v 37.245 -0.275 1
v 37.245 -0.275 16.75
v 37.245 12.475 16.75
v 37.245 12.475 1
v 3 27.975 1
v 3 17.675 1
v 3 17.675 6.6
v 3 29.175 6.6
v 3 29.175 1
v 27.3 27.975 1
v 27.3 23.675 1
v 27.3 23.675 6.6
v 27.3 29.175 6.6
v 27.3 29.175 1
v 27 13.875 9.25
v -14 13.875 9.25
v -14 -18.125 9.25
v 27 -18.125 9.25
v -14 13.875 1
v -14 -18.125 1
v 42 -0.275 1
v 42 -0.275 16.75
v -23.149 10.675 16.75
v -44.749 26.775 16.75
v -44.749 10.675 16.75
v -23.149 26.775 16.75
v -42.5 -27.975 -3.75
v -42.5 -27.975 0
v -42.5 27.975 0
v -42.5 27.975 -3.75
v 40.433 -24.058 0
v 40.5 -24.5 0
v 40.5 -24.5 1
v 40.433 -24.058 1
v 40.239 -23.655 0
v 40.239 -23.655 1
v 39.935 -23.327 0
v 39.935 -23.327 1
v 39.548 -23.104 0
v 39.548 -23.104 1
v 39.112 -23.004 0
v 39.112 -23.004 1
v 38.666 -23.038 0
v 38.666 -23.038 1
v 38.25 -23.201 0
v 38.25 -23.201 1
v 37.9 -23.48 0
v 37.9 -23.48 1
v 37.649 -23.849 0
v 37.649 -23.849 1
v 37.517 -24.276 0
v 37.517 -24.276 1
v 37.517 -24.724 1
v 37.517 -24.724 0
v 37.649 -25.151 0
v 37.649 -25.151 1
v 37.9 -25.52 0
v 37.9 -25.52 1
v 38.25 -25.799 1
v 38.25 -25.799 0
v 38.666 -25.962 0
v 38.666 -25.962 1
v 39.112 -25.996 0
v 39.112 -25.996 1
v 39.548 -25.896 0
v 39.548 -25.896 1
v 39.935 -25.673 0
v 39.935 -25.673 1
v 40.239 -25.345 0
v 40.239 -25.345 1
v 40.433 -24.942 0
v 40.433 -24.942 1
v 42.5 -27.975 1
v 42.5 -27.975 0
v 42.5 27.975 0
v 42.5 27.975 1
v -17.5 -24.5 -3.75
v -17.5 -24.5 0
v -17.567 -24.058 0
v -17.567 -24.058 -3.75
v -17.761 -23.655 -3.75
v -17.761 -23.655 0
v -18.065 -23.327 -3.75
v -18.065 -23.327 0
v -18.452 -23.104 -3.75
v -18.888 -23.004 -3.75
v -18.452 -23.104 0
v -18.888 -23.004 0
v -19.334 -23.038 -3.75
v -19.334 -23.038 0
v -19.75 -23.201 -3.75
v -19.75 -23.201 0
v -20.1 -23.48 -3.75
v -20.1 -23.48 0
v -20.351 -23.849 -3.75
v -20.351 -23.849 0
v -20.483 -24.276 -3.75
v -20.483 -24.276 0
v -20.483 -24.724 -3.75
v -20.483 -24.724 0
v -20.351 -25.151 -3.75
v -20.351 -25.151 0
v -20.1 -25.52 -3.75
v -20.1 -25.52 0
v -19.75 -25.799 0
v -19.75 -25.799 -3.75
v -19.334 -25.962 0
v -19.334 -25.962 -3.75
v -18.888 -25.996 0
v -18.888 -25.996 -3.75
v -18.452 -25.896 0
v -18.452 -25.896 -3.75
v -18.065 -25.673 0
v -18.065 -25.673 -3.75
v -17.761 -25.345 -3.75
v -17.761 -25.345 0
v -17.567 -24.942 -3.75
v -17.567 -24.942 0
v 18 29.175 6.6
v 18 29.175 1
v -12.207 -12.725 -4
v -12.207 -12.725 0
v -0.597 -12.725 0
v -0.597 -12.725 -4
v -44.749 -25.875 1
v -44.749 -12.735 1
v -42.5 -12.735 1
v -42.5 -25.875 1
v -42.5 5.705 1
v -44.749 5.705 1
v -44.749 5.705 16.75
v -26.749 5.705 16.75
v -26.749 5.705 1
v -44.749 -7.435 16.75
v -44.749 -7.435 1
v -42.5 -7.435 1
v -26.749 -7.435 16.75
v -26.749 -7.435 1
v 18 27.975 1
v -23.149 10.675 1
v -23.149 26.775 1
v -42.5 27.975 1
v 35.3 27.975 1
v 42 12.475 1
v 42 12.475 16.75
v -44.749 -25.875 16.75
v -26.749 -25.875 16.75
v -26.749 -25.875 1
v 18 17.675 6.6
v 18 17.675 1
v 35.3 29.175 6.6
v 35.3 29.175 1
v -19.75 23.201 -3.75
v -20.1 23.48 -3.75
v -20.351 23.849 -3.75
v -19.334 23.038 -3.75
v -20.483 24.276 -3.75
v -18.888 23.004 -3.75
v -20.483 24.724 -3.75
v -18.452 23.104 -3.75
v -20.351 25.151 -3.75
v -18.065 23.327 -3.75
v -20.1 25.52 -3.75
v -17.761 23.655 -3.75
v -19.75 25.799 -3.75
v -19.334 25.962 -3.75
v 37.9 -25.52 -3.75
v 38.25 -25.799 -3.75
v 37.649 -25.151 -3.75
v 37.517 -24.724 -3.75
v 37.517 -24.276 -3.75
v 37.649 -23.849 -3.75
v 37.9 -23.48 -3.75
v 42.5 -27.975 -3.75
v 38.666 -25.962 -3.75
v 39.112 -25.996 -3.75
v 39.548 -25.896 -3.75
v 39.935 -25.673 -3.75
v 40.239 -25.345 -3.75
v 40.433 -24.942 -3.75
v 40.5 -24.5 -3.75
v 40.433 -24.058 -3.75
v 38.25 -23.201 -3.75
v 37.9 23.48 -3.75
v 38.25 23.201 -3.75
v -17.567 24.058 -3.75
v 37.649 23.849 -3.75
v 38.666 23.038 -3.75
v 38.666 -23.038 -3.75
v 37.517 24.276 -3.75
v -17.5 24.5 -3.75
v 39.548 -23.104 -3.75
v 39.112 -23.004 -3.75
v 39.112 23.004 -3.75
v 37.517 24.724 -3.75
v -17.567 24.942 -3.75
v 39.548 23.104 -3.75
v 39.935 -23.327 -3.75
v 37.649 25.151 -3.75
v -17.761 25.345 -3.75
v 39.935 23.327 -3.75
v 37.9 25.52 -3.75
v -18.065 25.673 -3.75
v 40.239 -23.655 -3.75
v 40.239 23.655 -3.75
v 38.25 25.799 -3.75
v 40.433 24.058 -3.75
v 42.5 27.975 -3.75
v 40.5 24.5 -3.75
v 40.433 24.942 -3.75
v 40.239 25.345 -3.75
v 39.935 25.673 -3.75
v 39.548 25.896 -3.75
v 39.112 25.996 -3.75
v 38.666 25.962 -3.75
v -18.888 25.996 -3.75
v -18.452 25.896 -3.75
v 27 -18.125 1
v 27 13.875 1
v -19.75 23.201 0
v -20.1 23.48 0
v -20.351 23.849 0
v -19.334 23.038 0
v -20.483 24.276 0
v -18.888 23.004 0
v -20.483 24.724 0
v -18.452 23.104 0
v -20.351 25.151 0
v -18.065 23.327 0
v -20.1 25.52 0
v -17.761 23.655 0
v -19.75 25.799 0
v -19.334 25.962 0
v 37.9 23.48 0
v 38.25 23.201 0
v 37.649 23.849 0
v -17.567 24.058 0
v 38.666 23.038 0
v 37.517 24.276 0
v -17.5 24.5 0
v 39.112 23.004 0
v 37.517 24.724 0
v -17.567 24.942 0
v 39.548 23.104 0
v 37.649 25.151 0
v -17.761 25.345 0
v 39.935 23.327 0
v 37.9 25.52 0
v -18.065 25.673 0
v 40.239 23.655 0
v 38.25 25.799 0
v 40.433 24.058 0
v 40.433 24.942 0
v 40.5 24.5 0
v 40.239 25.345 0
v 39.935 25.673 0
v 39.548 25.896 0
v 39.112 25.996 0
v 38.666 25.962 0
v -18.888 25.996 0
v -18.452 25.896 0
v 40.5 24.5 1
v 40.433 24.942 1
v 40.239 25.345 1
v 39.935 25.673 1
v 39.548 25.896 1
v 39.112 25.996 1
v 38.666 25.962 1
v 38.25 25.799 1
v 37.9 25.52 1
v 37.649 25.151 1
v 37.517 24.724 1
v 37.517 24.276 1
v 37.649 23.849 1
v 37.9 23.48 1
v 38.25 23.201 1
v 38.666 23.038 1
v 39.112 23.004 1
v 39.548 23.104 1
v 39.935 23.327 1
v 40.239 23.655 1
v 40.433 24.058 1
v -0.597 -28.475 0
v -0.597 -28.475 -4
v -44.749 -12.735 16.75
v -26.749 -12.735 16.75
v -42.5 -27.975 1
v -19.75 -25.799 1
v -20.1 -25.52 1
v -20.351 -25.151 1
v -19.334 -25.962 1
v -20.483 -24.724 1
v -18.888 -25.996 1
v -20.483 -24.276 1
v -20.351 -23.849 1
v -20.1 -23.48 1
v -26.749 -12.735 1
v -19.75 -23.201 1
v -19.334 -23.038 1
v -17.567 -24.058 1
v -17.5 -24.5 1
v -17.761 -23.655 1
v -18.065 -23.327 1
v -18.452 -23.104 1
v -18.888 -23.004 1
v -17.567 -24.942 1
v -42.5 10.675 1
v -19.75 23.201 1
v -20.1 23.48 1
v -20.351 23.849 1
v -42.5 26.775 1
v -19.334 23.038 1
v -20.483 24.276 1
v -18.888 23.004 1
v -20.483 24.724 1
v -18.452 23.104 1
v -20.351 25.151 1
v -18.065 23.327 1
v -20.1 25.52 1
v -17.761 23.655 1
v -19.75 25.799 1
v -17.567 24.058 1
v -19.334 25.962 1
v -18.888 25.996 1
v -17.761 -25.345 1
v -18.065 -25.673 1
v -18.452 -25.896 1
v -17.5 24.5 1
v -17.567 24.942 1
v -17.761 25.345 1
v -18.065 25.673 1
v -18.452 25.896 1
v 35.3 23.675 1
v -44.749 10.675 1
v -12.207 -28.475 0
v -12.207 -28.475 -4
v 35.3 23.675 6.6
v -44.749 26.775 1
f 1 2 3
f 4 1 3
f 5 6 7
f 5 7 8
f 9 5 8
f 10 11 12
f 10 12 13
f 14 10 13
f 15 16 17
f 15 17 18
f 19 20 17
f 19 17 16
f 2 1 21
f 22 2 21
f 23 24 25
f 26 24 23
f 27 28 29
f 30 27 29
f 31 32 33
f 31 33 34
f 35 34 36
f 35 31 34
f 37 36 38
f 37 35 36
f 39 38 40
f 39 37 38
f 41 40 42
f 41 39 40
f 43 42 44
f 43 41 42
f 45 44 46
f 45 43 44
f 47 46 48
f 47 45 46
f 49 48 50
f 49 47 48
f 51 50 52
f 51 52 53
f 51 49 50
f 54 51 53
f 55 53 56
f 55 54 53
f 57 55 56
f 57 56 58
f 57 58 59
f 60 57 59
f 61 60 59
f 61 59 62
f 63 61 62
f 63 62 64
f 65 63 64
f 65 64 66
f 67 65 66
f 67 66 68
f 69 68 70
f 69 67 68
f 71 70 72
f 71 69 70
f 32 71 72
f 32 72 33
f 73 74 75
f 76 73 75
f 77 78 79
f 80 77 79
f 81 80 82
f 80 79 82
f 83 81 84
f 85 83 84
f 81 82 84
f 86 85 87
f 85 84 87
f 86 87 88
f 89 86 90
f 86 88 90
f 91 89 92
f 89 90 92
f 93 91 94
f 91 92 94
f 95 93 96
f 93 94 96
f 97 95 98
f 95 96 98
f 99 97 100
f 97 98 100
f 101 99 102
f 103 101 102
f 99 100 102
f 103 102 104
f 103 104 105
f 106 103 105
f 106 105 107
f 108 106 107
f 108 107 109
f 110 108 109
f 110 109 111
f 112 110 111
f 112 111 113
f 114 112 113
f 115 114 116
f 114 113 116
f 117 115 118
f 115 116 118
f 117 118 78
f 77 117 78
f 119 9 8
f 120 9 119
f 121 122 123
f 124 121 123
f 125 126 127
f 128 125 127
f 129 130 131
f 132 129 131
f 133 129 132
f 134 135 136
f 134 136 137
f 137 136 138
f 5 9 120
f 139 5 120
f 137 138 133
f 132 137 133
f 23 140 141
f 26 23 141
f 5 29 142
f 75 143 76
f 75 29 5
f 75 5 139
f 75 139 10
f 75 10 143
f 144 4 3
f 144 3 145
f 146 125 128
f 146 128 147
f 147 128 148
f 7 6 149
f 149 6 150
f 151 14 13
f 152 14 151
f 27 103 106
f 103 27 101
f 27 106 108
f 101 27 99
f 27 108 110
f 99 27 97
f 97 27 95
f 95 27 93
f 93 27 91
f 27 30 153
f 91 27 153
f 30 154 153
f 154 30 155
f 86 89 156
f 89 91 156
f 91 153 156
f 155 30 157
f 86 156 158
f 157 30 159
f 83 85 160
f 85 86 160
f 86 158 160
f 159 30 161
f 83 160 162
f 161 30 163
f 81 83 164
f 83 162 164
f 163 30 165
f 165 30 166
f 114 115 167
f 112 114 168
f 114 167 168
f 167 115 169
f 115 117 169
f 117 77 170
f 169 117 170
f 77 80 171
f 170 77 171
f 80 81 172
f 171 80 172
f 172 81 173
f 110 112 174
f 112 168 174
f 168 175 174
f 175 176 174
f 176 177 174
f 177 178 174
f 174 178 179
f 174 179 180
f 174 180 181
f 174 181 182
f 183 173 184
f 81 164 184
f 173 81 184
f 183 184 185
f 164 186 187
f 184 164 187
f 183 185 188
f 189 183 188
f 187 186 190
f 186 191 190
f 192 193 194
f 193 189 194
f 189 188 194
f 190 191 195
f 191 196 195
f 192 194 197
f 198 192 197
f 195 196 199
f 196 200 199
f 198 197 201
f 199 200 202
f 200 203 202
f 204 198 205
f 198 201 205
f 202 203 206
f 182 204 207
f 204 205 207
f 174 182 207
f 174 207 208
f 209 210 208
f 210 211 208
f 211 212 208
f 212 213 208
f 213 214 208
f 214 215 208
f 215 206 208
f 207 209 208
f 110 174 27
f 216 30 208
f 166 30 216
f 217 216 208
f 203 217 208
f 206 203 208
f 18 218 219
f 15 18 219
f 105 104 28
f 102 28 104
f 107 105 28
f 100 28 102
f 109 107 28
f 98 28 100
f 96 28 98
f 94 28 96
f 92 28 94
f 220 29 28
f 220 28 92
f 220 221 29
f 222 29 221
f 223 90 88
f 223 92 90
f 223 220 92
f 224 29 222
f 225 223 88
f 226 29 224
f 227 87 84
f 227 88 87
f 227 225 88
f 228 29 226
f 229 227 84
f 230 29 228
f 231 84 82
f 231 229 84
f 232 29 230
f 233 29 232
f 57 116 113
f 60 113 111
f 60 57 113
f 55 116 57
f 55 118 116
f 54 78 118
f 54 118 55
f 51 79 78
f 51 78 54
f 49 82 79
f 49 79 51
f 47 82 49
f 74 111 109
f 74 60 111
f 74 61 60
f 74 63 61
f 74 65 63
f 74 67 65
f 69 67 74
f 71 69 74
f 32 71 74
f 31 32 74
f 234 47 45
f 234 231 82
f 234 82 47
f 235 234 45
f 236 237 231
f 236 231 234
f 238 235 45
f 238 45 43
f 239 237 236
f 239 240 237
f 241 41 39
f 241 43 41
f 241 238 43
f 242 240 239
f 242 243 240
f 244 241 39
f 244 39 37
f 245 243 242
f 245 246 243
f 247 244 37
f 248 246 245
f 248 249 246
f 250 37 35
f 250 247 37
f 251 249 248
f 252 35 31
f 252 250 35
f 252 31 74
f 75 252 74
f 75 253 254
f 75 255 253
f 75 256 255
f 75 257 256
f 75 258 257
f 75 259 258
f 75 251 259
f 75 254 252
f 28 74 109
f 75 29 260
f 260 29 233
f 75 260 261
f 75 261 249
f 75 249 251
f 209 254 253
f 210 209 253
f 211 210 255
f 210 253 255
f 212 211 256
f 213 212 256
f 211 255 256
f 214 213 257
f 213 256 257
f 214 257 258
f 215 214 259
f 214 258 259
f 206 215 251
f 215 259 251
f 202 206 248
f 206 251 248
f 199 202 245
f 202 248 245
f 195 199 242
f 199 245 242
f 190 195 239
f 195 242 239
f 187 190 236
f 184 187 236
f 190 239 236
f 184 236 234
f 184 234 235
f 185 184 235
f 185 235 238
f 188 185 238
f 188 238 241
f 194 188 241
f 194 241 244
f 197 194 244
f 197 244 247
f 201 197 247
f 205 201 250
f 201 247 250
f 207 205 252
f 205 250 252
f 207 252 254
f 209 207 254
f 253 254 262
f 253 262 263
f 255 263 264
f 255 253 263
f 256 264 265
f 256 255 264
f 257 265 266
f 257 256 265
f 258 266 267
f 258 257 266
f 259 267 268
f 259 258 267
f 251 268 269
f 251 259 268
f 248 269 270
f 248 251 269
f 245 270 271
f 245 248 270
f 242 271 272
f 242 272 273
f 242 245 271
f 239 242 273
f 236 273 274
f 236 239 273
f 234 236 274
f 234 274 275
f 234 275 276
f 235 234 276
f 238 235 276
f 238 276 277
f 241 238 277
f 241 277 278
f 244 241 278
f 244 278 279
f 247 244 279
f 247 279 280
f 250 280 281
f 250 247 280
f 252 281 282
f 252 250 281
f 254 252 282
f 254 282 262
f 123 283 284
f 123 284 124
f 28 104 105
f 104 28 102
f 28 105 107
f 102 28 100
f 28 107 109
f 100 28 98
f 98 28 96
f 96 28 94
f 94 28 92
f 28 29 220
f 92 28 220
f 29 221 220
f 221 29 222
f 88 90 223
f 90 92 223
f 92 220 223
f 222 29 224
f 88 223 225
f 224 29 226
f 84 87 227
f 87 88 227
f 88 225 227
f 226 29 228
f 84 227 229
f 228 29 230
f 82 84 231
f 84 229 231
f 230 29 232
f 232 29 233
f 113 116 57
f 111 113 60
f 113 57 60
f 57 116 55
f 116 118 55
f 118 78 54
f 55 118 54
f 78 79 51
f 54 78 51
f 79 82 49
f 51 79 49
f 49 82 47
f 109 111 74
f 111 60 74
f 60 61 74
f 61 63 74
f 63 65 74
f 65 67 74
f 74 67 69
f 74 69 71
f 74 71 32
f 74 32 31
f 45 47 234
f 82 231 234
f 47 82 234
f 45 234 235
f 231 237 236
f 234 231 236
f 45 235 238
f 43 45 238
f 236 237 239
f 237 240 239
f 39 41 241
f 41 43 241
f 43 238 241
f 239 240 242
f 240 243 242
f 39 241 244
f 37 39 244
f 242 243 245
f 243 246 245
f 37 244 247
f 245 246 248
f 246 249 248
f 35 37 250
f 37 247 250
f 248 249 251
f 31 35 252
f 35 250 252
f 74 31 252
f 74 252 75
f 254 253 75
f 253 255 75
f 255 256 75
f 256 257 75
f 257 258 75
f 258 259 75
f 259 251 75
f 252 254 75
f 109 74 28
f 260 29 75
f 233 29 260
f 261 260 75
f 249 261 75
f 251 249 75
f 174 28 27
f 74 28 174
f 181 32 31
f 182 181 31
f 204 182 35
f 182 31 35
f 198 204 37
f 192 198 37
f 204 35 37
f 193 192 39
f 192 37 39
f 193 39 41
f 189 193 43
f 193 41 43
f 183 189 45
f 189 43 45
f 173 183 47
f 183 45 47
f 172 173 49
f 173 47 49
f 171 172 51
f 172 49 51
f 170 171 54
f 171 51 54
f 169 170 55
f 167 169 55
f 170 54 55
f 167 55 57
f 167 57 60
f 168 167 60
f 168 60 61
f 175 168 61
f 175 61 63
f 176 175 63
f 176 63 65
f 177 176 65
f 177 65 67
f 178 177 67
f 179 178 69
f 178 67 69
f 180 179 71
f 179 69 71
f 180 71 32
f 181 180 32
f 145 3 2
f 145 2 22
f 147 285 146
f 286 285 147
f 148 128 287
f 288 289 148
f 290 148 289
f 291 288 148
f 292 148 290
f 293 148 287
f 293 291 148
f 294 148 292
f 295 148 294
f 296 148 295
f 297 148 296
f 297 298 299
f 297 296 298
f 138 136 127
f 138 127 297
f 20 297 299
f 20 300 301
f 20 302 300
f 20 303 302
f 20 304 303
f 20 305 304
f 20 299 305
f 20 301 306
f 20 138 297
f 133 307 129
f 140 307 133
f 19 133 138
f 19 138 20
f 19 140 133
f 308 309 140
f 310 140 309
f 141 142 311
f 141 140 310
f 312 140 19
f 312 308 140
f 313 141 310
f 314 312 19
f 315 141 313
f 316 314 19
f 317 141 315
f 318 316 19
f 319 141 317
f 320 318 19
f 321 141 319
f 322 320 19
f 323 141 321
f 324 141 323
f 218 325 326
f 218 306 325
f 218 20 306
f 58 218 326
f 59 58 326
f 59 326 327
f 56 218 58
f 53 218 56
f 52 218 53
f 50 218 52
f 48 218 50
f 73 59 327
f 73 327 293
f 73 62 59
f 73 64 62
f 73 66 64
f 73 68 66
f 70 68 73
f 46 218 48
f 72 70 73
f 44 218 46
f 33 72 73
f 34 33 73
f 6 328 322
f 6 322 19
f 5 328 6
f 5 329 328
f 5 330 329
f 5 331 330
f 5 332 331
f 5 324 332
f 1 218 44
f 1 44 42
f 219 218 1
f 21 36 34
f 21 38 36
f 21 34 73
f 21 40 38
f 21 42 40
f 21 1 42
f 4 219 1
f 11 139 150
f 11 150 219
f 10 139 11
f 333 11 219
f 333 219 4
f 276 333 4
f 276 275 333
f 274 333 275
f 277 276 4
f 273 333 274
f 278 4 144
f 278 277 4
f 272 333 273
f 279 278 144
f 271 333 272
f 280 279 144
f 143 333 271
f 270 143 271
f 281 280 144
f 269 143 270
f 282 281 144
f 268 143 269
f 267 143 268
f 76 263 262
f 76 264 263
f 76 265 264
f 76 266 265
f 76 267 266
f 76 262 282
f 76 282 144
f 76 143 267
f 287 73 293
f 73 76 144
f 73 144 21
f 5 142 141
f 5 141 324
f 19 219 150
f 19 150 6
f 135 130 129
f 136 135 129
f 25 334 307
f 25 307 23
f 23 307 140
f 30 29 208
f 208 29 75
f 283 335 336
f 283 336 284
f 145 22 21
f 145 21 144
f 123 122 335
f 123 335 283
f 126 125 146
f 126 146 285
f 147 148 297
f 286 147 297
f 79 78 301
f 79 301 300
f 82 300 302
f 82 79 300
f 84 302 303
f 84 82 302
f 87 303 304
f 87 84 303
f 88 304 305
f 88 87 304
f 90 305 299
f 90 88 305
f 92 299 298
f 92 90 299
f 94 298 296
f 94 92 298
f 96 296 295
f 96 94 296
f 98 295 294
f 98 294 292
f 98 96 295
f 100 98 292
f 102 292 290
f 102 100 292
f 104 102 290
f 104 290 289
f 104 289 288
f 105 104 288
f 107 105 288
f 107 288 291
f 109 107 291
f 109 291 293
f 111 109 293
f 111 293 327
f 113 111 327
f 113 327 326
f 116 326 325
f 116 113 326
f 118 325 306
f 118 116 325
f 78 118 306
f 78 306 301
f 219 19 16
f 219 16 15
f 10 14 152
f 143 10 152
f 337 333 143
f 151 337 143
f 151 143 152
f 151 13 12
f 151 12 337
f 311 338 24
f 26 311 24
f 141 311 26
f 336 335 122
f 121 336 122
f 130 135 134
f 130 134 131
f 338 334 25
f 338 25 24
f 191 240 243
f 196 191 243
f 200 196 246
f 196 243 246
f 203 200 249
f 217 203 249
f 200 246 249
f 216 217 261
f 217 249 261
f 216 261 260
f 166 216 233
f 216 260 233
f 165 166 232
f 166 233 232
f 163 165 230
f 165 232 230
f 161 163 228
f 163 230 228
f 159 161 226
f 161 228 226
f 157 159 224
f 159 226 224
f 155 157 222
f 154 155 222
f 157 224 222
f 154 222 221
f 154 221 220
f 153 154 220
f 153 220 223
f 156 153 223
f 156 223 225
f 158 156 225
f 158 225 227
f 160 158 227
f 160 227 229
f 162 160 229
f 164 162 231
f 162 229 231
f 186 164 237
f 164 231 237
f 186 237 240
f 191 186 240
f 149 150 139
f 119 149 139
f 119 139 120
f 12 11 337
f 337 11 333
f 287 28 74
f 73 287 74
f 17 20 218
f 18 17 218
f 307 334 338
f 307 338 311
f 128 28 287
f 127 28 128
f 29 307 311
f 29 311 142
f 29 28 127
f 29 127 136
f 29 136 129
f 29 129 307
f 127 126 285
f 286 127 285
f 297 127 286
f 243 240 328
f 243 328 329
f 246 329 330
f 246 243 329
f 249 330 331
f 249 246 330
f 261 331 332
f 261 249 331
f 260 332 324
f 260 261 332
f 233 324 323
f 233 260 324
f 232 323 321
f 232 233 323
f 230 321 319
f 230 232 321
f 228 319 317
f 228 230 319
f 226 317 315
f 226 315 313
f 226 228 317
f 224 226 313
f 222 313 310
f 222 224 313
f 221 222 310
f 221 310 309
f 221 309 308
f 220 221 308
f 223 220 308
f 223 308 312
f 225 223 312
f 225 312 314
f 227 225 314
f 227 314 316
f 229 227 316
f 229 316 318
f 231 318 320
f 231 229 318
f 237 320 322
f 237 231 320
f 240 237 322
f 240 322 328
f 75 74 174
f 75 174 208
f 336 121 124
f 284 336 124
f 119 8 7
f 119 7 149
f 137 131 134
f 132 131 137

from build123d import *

# Parameters (mm, degrees)
SKETCH1_W                         = 85
SKETCH1_H                         = 55.95
SKETCH1_R                         = 1.5
BOSS_EXTRUDE1_DEPTH               = 1
SKETCH1_2_W                       = 85
SKETCH1_2_H                       = 55.95
SKETCH1_2_R                       = 1.5
BOSS_EXTRUDE2_LOWER_KEEPOUT_DEPTH = 3.75
SKETCH3_W                         = 41
SKETCH3_H                         = 32
BOSS_EXTRUDE3_DEPTH               = 8.25
SKETCH4_W                         = 18
SKETCH4_H                         = 13.14
SKETCH4_W_2                       = 4.755
SKETCH4_H_2                       = 12.75
SKETCH4_W_3                       = 21.6
SKETCH4_H_3                       = 16.1
BOSS_EXTRUDE4_DEPTH               = 15.75
SKETCH5_W                         = 15
SKETCH5_H                         = 11.5
SKETCH5_W_2                       = 8
SKETCH5_H_2                       = 5.5
BOSS_EXTRUDE5_DEPTH               = 5.6
SKETCH6_W                         = 11.61
SKETCH6_H                         = 15.75
BOSS_EXTRUDE6_DEPTH               = 4


with BuildPart() as part:
    # Sketch1 → Boss-Extrude1 (new body)
    with BuildSketch(Plane.XY):
        Rectangle(SKETCH1_W, SKETCH1_H)
        with Locations((-19.000000078, 24.5)):
            Circle(SKETCH1_R, mode=Mode.SUBTRACT)
        with Locations((-19.000000078, -24.5)):
            Circle(SKETCH1_R, mode=Mode.SUBTRACT)
        with Locations((39, 24.5)):
            Circle(SKETCH1_R, mode=Mode.SUBTRACT)
        with Locations((39, -24.5)):
            Circle(SKETCH1_R, mode=Mode.SUBTRACT)
    extrude(amount=BOSS_EXTRUDE1_DEPTH)

    # Sketch3 → Boss-Extrude3 (add)
    with BuildSketch(Plane.XY.offset(1)):
        with Locations((6.5, -2.125)):
            Rectangle(SKETCH3_W, SKETCH3_H)
    extrude(amount=BOSS_EXTRUDE3_DEPTH)

    # Sketch4 → Boss-Extrude4 (add)
    with BuildSketch(Plane.XY.offset(1)):
        with Locations((-35.74947609, -0.865)):
            Rectangle(SKETCH4_W, SKETCH4_H)
        with Locations((-35.74947609, -19.305)):
            Rectangle(SKETCH4_W, SKETCH4_H)
        with Locations((39.6225, 6.1)):
            Rectangle(SKETCH4_W_2, SKETCH4_H_2)
        with Locations((-33.94947609, 18.725)):
            Rectangle(SKETCH4_W_3, SKETCH4_H_3)
    extrude(amount=BOSS_EXTRUDE4_DEPTH)

    # Sketch5 → Boss-Extrude5 (add)
    with BuildSketch(Plane.XY.offset(1)):
        with Locations((10.5, 23.425)):
            Rectangle(SKETCH5_W, SKETCH5_H)
        with Locations((31.3, 26.425)):
            Rectangle(SKETCH5_W_2, SKETCH5_H_2)
    extrude(amount=BOSS_EXTRUDE5_DEPTH)


with BuildPart() as body_2:
    # Sketch1<2> → Boss-Extrude2-lower-keepout (new body)
    with BuildSketch(Plane.XY):
        Rectangle(SKETCH1_2_W, SKETCH1_2_H)
        with Locations((-19.000000078, 24.5)):
            Circle(SKETCH1_2_R, mode=Mode.SUBTRACT)
        with Locations((-19.000000078, -24.5)):
            Circle(SKETCH1_2_R, mode=Mode.SUBTRACT)
        with Locations((39, 24.5)):
            Circle(SKETCH1_2_R, mode=Mode.SUBTRACT)
        with Locations((39, -24.5)):
            Circle(SKETCH1_2_R, mode=Mode.SUBTRACT)
    extrude(amount=-BOSS_EXTRUDE2_LOWER_KEEPOUT_DEPTH)


with BuildPart() as body_3:
    # Sketch6 → Boss-Extrude6 (new body)
    with BuildSketch(Plane.XY):
        with Locations((-6.401910681, -20.6)):
            Rectangle(SKETCH6_W, SKETCH6_H)
    extrude(amount=-BOSS_EXTRUDE6_DEPTH)


solid = Compound([part.part, body_2.part, body_3.part])
